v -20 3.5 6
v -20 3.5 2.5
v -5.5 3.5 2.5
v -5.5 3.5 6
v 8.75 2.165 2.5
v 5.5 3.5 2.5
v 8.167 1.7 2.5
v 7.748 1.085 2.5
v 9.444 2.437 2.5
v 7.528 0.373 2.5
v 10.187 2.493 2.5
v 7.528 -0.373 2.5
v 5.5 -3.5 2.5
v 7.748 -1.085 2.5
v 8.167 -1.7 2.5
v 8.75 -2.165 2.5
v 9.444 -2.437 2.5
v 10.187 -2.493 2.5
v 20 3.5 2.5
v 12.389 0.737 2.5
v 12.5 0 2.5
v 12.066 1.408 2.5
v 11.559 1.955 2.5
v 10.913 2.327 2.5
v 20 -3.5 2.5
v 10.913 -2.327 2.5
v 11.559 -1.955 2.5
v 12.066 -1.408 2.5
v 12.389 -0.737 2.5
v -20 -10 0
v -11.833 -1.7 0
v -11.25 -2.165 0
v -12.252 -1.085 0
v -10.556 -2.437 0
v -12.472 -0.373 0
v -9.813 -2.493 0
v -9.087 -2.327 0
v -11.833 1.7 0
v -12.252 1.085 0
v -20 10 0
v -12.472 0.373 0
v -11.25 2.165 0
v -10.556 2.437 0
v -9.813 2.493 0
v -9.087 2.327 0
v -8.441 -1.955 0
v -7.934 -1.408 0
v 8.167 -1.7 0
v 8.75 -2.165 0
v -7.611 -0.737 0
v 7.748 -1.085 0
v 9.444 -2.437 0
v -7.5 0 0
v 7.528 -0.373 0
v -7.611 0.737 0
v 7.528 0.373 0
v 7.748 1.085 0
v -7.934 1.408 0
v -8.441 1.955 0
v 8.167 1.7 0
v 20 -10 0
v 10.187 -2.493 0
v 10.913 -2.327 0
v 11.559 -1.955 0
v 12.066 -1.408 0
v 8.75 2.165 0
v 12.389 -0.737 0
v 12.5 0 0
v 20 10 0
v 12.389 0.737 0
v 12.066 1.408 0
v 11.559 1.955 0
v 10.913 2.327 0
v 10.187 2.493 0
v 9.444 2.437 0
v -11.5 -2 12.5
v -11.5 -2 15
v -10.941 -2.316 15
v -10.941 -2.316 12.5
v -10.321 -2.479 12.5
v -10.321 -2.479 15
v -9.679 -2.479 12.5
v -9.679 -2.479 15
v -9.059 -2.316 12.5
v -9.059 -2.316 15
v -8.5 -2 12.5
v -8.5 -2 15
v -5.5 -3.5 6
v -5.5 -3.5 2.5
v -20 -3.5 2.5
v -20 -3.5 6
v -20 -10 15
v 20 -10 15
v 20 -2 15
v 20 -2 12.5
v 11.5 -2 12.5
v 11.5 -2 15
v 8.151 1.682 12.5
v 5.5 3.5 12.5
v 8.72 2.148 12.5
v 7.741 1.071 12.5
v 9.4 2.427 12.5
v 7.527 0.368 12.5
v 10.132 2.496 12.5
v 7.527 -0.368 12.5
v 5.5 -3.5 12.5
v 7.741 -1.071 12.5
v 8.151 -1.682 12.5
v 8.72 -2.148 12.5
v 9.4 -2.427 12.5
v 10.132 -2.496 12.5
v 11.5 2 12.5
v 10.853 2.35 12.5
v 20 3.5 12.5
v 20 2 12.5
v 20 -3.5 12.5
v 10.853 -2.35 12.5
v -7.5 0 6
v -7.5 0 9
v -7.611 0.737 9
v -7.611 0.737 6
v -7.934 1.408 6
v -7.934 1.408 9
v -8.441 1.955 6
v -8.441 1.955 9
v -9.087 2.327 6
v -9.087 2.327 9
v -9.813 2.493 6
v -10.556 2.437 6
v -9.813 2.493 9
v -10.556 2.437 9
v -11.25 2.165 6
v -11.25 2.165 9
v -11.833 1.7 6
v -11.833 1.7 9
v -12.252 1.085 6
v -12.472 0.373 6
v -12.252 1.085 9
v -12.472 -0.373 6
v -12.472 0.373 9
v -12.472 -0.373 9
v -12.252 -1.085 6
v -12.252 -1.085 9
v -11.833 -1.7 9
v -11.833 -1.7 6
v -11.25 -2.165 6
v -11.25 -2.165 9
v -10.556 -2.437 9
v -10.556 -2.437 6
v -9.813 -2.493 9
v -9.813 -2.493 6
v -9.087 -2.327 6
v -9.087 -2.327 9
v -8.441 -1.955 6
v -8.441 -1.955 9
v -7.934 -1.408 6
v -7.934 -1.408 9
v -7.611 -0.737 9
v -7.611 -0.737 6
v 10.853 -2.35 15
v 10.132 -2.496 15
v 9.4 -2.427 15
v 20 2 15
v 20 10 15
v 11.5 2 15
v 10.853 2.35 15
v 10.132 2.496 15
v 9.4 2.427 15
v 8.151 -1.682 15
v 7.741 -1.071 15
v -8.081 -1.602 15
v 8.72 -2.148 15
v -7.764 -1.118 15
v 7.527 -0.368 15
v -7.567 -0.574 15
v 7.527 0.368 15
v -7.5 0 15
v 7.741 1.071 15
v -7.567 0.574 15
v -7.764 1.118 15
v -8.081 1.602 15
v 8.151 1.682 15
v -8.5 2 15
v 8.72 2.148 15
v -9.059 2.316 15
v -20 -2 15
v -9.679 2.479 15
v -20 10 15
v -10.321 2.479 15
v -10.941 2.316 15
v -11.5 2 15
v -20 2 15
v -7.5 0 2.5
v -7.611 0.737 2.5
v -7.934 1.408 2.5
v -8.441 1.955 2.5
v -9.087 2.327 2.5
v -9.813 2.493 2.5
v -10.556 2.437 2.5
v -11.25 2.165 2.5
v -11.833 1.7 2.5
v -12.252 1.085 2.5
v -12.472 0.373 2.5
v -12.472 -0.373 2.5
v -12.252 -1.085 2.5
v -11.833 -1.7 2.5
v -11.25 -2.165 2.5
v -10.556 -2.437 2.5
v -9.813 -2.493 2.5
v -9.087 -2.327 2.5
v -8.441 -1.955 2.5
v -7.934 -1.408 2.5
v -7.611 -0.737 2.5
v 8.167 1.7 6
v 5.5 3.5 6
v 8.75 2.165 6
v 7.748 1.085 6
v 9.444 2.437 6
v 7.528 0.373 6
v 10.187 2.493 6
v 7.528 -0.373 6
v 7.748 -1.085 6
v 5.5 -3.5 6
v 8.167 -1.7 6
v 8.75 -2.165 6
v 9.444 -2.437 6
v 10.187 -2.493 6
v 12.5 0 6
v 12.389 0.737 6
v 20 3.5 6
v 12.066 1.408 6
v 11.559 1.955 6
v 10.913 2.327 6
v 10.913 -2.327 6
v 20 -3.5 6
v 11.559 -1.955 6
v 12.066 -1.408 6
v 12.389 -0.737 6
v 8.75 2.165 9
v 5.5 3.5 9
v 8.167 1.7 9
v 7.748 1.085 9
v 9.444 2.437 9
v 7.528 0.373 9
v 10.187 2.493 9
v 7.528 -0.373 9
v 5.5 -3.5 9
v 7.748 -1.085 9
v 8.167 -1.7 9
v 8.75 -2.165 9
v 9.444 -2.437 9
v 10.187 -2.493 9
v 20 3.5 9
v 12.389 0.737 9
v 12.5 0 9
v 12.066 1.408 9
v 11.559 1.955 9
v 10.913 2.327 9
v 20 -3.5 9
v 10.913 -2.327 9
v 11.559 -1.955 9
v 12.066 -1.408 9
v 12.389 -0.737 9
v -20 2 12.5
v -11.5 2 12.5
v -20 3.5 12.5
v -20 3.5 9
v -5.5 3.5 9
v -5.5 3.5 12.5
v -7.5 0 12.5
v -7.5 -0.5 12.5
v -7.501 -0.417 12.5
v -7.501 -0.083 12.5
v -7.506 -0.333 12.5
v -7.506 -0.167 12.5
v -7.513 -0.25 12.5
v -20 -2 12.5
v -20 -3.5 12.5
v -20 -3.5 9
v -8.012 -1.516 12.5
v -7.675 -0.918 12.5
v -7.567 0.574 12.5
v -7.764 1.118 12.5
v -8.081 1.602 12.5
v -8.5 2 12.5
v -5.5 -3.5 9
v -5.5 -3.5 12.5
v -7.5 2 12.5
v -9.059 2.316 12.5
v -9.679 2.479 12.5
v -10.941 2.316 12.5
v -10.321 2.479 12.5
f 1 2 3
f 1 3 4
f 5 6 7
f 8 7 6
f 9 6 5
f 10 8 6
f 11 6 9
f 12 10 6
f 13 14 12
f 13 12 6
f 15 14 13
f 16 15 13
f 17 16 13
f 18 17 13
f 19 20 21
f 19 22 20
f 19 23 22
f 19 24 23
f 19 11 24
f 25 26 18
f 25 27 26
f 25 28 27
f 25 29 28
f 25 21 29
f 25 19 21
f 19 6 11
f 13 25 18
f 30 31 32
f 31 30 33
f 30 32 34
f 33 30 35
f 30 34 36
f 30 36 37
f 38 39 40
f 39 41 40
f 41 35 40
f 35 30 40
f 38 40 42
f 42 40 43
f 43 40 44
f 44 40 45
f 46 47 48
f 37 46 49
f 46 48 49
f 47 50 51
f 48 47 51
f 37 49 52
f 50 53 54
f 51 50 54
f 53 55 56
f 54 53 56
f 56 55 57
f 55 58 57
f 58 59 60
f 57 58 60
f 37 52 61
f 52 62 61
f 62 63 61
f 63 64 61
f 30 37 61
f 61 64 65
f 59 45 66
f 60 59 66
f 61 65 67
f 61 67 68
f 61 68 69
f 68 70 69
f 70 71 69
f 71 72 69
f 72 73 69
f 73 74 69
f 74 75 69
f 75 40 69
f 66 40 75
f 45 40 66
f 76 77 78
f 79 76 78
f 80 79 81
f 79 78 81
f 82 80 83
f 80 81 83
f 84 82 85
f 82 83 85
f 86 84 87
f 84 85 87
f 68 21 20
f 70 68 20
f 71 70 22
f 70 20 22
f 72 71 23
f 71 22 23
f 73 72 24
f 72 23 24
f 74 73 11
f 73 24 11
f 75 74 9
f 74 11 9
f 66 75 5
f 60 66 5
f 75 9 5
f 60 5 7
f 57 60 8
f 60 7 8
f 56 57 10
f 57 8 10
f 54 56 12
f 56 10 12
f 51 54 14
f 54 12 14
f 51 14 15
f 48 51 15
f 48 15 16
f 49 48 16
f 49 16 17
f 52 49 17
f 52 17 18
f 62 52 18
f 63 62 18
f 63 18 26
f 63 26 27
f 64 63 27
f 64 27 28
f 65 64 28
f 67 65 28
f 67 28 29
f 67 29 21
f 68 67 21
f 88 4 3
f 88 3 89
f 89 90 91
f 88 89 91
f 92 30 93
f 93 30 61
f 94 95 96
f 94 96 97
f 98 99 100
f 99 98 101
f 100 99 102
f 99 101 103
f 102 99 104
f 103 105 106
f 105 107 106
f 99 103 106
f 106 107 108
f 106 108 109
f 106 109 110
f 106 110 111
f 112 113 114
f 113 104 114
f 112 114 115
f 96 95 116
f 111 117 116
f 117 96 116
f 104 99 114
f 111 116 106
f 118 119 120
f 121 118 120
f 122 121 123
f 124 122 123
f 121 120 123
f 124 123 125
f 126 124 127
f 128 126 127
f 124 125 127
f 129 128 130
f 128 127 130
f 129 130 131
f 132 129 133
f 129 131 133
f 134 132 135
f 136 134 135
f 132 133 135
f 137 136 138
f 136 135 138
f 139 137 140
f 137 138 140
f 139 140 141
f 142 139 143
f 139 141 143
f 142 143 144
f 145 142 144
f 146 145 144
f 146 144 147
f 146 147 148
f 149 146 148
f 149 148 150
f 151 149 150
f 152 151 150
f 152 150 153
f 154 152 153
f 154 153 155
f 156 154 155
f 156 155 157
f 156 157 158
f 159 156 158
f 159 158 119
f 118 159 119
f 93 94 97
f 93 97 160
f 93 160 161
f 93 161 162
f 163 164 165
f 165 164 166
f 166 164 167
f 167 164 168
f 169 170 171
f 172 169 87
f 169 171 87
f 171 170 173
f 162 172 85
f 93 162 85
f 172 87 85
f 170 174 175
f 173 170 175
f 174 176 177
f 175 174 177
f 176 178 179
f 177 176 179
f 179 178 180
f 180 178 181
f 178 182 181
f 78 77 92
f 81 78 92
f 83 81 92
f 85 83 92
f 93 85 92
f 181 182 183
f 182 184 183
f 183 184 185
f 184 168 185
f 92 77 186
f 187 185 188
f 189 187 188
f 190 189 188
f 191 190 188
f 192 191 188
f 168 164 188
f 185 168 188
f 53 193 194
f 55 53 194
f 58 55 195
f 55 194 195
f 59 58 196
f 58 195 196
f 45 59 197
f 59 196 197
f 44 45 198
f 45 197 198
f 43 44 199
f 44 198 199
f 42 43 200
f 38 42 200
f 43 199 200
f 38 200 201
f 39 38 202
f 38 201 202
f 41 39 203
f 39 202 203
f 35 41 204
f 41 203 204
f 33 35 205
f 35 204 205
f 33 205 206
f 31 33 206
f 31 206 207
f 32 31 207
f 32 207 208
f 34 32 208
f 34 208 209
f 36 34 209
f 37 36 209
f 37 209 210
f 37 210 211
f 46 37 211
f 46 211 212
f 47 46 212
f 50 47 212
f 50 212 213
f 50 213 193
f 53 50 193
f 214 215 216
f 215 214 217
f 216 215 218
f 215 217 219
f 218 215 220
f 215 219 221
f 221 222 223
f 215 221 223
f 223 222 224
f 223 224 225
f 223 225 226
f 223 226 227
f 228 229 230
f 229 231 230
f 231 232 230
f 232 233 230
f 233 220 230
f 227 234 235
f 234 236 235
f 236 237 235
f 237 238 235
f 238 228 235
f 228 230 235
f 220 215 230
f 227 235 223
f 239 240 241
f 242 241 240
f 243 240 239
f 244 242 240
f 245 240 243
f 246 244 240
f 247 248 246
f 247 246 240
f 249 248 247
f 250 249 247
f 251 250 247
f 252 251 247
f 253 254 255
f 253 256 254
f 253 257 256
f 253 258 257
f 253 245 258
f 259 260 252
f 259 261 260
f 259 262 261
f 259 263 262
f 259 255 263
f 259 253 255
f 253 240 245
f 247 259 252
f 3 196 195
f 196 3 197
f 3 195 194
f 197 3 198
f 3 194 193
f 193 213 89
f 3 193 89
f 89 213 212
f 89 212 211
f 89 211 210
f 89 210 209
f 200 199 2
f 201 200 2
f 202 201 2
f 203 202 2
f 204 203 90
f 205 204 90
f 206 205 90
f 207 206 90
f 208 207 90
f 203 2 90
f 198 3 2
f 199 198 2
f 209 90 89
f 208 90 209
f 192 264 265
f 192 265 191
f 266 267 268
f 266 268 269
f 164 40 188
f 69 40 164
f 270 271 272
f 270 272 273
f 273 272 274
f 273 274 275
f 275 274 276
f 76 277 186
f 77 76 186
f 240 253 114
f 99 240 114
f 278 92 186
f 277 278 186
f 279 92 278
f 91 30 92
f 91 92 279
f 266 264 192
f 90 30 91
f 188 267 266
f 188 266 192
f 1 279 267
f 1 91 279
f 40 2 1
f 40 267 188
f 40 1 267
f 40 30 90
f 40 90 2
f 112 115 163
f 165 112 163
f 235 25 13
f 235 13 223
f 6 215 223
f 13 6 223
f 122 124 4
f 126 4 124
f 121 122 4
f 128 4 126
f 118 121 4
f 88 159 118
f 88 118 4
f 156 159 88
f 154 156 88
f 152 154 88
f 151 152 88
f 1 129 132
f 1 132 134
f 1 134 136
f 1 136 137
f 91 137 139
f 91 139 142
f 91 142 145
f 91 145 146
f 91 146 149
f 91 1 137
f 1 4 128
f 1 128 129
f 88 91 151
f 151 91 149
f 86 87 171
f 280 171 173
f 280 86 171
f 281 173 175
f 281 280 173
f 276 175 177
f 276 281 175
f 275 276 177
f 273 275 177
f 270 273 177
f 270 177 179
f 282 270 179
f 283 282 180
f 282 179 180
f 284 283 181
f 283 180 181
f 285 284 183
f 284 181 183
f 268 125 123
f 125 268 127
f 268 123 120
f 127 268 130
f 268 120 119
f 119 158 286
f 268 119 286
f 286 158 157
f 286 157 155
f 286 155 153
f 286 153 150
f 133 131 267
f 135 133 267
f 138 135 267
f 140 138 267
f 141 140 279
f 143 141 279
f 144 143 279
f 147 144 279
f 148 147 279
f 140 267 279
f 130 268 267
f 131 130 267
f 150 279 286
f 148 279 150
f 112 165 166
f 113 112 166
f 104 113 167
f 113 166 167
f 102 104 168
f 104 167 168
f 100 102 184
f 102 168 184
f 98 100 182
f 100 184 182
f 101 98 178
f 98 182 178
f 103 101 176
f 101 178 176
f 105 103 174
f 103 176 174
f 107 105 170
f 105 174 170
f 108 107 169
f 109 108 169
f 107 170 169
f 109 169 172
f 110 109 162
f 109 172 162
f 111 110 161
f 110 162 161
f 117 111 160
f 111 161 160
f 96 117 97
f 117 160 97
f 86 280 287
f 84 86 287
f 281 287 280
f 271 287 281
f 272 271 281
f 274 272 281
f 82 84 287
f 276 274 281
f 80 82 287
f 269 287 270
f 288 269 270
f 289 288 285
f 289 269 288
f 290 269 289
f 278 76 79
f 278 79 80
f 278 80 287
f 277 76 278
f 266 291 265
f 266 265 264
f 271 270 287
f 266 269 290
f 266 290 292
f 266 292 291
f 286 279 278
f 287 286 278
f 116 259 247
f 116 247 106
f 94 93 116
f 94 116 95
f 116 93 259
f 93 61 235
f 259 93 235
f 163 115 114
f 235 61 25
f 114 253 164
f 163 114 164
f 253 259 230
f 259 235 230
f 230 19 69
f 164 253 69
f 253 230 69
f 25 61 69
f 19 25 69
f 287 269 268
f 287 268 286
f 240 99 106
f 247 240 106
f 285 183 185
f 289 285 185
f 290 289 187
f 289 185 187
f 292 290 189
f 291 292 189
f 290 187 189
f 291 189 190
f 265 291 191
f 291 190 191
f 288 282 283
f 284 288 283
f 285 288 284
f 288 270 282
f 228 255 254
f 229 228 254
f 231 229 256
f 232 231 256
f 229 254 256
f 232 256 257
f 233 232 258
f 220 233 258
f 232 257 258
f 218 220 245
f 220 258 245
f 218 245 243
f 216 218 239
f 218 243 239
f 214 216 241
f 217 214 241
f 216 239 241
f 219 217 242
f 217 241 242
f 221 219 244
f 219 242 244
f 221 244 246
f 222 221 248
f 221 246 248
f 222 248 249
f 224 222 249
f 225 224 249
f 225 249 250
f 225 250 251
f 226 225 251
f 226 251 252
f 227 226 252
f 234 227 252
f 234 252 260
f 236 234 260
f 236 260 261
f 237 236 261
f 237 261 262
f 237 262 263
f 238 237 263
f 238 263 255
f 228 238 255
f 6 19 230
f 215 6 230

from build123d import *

# Parameters (mm, degrees)
F0_W            = 40
F0_H            = 20
F1_DEPTH        = 15
F2_R            = 2.5
F3_DEPTH        = 15.001
F4_W            = 7
F4_H            = 3.5
F5_DEPTH        = 14.5
F6_W            = 4
F6_H            = 2.5
F7_DEPTH        = 12.5
F7_COPIES_COUNT = 2
F7_COPIES_PITCH = 31.5
F8_T1_DEPTH     = 2.5
F9_T4_DEPTH     = 2.5
F9_S5_R         = 2.5
F9_T6_DEPTH     = 4


# Not quite as in the source:
# - a fillet or chamfer that OpenCascade refuses, or shapes differently, is made with other operations: its cross-section is extruded or revolved along the edge and cut away or added
# - a pattern or mirror of a feature is missing from the dataset's text; its kind, count and spacing are read off the source's solid


with BuildPart() as f1:
    # F0 (on Top) → F1 (new body)
    with BuildSketch(Plane.XY):
        Rectangle(F0_W, F0_H)
    extrude(amount=F1_DEPTH)

    # F2 (on face) → F3 (cut, through all)
    with BuildSketch(Plane.XY.offset(15)):
        with Locations((-10, 0)):
            Circle(F2_R)
        with Locations((10, 0)):
            Circle(F2_R)
    extrude(amount=-F3_DEPTH, mode=Mode.SUBTRACT)

    # F4 (on face) → F5 (cut)
    with BuildSketch(Plane(origin=(-20, 0, 0), x_dir=(0, -1, 0), z_dir=(-1, 0, 0))):
        with Locations((0, 4.25)):
            Rectangle(F4_W, F4_H)
        with Locations((0, 10.75)):
            Rectangle(F4_W, F4_H)
    f5 = extrude(amount=-F5_DEPTH, mode=Mode.SUBTRACT)

    # F5_copies: F5 across plane
    add(f5.mirror(Plane(origin=(0, 0, 0), x_dir=(0, 0, 1), z_dir=(1, 0, 0))), mode=Mode.SUBTRACT)

    # F6 (on face) → F7 (cut)
    with BuildSketch(Plane(origin=(-20, 0, 0), x_dir=(0, -1, 0), z_dir=(-1, 0, 0))):
        with Locations((0, 13.75)):
            Rectangle(F6_W, F6_H)
    f7 = extrude(amount=-F7_DEPTH, mode=Mode.SUBTRACT)

    # F7_copies: F7 ×2
    with Locations(*[(i * F7_COPIES_PITCH, 0, 0) for i in range(1, F7_COPIES_COUNT)]):
        add(f7, mode=Mode.SUBTRACT)

    # F8: fillet of radius 2.5 on 1 edges, made by hand

    # F8_s2 → F8_t1 (join)
    with BuildSketch(Plane.XY.offset(12.5)):
        with BuildLine():
            ThreePointArc((-8.5, -2), (-7.7639320225, -1.1180339887), (-7.5, 0))
            Line((-7.5, 0), (-7.5, -2))
            Line((-7.5, -2), (-8.5, -2))
        make_face()
    extrude(amount=F8_T1_DEPTH)

    # F9: fillet of radius 2.5 on 1 edges, made by hand


with BuildPart() as f9_tool2:
    # F9_s3 → F9_t4 (new body)
    with BuildSketch(Plane.XY.offset(15)):
        with BuildLine():
            ThreePointArc((-7.5, -0.5), (-8.232233047, 1.267766953), (-10, 2))
            Line((-10, 2), (-7.5, 2))
            Line((-7.5, 2), (-7.5, -0.5))
        make_face()
    extrude(amount=-F9_T4_DEPTH)

    # F9_s5 → F9_t6 (cut, symmetric)
    with BuildSketch(Plane.XY.offset(13.8)):
        with Locations((-10, 0)):
            Circle(F9_S5_R)
    extrude(amount=F9_T6_DEPTH, both=True, mode=Mode.SUBTRACT)


with BuildPart() as f1_1:
    add(f1.part)

    # F9_t1: union F9_tool2
    add(f9_tool2.part)


solid = f1_1.part
